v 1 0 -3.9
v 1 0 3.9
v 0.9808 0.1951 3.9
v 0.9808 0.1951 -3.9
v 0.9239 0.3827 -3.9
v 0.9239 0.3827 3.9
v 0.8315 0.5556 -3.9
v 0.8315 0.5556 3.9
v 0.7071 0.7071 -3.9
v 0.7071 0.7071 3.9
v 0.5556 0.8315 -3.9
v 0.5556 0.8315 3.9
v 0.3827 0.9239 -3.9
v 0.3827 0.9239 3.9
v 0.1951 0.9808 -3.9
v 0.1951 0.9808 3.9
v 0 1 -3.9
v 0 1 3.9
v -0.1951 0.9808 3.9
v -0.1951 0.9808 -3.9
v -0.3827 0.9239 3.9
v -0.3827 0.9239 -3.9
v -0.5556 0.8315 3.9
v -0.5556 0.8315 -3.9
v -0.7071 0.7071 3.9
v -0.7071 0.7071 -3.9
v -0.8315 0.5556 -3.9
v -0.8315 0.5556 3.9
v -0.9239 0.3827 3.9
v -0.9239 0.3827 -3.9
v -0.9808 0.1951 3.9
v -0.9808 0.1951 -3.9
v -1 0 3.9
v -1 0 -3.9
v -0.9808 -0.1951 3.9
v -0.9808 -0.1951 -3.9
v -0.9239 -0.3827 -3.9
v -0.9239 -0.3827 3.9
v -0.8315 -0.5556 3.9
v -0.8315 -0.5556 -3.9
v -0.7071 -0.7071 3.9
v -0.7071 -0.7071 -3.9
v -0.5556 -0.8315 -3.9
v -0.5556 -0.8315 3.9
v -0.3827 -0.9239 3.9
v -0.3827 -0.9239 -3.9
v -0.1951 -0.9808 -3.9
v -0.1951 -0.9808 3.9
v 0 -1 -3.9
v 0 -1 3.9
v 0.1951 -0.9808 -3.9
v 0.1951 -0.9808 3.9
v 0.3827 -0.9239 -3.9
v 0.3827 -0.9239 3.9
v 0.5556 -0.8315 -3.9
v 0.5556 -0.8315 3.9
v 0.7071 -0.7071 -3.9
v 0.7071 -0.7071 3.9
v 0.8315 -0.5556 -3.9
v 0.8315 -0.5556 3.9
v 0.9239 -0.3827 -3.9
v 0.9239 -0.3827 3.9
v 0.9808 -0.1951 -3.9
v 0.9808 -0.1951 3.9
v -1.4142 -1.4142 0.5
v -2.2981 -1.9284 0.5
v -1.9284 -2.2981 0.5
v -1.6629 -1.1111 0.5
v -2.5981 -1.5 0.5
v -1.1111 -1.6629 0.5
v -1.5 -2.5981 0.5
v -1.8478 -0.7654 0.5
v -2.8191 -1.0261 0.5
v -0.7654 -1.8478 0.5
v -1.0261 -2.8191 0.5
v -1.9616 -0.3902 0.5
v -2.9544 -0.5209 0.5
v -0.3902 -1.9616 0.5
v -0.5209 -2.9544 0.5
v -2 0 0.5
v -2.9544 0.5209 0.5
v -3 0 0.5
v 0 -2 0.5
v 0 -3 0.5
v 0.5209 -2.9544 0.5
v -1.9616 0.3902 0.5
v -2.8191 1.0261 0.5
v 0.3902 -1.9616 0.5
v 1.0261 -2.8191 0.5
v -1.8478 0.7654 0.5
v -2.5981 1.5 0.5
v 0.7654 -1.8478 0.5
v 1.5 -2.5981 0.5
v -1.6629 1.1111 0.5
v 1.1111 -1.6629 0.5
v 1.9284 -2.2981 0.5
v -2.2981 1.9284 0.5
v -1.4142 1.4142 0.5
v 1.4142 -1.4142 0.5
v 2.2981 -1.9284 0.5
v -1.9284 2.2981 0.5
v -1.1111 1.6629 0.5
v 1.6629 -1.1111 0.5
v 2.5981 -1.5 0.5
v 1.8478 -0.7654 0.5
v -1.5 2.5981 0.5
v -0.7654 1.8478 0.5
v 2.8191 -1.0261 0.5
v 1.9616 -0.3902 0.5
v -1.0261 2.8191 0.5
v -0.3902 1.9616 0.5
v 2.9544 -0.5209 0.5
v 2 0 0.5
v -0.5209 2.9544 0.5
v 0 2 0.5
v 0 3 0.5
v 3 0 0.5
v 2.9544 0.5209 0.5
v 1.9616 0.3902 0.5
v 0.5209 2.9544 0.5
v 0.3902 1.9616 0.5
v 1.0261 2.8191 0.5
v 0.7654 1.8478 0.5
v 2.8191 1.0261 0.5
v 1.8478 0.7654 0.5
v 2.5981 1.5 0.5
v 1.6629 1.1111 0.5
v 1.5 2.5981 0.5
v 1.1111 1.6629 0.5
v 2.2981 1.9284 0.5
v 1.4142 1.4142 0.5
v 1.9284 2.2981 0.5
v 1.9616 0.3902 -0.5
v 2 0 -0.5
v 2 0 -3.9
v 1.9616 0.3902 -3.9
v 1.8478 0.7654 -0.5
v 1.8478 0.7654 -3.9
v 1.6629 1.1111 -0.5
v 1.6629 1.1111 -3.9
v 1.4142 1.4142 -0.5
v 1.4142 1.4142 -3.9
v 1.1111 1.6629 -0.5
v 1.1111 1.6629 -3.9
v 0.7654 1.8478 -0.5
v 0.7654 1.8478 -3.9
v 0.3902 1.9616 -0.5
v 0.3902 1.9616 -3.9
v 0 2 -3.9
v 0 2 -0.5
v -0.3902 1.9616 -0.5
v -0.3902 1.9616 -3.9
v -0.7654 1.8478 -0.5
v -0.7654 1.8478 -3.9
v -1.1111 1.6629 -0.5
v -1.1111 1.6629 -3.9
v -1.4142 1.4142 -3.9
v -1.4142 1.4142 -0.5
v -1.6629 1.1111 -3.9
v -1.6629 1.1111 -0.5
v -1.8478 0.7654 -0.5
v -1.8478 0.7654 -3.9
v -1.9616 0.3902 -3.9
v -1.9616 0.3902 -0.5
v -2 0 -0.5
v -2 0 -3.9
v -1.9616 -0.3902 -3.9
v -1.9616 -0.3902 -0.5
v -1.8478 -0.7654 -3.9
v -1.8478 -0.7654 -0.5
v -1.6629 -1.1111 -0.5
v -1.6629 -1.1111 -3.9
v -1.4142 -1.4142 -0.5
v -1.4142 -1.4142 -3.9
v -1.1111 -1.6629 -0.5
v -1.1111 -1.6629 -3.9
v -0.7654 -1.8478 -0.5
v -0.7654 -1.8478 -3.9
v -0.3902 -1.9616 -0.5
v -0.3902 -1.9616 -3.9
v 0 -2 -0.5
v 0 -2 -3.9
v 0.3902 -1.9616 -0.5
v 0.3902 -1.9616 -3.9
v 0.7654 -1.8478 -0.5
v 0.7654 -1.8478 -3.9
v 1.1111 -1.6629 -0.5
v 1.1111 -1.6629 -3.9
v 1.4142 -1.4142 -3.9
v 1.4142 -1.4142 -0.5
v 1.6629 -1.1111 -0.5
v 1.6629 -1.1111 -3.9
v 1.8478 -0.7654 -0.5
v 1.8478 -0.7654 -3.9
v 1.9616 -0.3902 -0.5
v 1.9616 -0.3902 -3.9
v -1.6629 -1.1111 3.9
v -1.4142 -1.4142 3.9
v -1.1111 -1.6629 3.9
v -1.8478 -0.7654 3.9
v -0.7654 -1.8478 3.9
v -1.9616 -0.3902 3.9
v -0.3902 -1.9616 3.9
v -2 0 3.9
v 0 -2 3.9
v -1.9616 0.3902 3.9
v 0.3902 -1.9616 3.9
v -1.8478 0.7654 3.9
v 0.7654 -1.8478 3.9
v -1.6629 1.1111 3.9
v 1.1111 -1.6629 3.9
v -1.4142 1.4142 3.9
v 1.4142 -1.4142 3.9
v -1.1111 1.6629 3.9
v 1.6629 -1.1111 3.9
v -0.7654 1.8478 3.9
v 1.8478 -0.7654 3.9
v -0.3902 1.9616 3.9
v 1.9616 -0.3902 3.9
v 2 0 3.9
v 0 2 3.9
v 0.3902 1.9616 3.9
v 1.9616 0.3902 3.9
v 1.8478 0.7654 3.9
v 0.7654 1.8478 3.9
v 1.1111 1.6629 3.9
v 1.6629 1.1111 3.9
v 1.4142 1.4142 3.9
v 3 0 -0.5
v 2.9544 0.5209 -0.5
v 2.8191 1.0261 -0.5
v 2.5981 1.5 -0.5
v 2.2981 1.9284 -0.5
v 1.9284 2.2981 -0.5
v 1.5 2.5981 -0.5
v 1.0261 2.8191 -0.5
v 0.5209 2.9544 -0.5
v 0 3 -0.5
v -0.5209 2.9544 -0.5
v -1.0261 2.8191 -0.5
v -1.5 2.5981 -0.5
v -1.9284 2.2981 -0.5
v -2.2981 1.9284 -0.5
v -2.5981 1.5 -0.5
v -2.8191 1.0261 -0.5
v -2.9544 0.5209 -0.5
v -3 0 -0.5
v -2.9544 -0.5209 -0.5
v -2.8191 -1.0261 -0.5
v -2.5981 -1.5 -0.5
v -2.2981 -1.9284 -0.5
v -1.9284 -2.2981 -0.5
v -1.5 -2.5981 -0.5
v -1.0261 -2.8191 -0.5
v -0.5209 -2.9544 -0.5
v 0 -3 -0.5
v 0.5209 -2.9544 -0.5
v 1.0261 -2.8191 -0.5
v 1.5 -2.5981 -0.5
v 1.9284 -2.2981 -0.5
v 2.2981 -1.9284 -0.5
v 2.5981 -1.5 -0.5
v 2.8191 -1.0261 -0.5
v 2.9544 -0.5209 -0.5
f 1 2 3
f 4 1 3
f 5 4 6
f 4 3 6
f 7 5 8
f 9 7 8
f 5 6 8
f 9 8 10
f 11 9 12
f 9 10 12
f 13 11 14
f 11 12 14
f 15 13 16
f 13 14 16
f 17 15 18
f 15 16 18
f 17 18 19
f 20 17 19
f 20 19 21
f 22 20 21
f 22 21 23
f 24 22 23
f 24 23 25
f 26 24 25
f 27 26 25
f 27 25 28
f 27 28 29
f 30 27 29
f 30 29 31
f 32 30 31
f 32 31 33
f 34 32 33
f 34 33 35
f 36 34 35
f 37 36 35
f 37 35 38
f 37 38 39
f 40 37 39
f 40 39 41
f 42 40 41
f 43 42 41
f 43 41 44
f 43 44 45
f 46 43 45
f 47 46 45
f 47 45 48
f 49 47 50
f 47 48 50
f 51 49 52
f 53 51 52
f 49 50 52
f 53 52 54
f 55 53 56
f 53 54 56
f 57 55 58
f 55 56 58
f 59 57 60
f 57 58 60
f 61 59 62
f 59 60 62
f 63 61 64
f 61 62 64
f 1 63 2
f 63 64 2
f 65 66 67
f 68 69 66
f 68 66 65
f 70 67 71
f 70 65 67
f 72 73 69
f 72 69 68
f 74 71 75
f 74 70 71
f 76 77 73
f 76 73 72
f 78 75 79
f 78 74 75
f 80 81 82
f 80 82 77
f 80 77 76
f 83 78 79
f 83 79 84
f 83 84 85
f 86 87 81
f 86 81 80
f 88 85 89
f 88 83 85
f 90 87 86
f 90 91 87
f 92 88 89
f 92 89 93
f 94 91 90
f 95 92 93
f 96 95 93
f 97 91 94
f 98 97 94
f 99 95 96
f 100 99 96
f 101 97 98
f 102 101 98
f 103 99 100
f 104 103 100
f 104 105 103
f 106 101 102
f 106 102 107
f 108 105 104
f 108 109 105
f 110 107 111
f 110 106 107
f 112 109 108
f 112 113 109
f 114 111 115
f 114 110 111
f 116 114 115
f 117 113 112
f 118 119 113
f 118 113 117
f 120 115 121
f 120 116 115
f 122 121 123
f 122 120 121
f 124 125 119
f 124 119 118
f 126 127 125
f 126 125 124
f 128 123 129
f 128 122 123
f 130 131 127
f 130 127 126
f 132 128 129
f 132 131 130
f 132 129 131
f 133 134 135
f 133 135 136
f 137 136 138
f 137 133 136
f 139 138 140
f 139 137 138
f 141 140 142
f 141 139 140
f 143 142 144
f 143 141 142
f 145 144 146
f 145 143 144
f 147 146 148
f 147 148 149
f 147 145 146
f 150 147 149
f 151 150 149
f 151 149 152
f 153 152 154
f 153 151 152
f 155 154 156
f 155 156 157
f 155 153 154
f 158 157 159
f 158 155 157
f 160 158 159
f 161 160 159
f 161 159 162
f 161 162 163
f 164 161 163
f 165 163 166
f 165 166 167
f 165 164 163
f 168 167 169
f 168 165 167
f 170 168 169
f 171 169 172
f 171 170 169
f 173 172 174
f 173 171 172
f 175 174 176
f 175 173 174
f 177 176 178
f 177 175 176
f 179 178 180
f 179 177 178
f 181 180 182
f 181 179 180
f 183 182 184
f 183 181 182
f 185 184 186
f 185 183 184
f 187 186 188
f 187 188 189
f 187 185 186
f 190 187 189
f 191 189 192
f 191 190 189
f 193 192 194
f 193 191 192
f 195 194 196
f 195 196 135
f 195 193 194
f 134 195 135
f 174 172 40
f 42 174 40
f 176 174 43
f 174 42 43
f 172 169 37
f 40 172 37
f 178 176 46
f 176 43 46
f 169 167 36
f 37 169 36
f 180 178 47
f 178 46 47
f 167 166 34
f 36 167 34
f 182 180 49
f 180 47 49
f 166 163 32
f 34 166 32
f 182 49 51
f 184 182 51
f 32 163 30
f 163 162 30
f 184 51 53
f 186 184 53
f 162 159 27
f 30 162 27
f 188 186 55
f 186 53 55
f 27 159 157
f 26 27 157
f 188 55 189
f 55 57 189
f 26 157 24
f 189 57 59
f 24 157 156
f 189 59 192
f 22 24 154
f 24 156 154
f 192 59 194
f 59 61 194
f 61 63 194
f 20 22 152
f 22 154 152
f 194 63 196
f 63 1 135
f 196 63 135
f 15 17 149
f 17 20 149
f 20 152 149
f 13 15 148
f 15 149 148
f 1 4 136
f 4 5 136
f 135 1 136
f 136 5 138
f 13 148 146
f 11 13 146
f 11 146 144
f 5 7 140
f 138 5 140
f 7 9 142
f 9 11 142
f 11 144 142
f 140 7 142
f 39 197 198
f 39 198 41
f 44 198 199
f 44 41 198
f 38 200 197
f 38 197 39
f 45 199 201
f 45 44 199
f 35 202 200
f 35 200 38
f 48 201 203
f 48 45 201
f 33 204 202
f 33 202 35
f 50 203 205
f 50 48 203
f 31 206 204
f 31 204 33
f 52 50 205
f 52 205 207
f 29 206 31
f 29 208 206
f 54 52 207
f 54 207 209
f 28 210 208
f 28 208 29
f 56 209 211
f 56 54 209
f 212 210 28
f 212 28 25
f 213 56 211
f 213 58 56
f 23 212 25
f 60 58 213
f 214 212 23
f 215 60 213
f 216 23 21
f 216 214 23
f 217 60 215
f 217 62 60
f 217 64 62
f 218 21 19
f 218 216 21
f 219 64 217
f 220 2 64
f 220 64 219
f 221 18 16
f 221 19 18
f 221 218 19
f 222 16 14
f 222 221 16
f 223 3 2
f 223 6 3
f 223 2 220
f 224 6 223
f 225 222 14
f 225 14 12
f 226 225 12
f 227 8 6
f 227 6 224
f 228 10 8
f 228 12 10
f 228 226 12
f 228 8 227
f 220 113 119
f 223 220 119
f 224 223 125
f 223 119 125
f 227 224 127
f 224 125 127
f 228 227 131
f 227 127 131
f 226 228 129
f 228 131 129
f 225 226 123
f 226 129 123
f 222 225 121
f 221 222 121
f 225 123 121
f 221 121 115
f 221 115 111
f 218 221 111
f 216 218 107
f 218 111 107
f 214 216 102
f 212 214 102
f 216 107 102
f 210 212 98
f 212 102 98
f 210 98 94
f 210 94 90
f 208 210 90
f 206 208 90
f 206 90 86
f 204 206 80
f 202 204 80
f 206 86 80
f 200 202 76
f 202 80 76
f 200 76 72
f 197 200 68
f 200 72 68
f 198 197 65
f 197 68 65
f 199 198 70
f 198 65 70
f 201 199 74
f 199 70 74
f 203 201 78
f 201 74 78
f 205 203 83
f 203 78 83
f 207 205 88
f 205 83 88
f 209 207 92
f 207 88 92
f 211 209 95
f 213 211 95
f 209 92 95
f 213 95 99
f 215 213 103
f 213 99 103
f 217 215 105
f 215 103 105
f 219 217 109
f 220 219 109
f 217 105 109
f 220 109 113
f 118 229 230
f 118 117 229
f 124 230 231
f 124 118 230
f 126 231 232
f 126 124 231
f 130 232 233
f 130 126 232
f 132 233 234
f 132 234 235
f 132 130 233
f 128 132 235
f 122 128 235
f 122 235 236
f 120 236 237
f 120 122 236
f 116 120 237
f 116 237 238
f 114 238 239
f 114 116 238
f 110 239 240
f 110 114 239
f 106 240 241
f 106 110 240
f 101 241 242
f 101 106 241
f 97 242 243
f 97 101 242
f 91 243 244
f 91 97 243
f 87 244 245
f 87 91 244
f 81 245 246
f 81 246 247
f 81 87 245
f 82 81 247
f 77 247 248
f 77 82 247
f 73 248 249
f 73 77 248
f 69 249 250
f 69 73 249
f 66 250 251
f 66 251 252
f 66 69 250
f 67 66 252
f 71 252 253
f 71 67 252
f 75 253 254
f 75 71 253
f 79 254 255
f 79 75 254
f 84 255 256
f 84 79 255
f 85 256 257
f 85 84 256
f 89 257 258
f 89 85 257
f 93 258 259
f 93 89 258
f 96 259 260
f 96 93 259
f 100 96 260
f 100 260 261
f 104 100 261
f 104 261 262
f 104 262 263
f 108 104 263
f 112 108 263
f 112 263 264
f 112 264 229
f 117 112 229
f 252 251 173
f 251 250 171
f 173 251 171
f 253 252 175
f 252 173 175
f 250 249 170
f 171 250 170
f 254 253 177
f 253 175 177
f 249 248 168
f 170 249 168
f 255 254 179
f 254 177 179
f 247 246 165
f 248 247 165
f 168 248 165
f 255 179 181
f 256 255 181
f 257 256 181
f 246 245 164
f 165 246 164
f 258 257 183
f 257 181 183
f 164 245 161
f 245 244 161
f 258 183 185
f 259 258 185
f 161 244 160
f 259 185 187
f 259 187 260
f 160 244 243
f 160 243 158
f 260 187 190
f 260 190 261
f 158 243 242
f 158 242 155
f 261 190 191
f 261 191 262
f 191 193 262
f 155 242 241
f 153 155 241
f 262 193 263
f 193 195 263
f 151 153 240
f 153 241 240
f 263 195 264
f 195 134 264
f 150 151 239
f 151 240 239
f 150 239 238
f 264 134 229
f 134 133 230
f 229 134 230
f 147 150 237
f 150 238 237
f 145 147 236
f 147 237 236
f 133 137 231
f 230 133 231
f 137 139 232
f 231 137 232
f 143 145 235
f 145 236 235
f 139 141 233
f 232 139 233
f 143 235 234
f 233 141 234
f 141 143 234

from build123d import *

# Parameters (mm, degrees)
FLANGE_SKETCH_R      = 3
FLANGE_EXTRUDE_DEPTH = 0.5
JOINT_SKETCH_R       = 2
JOINT_EXTRUDE_DEPTH  = 3.4
HOLE_SKETCH_R        = 1
HOLE_EXTRUDE_DEPTH   = 9.879189152


with BuildPart() as part:
    # Flange Sketch → Flange Extrude (new, symmetric)
    with BuildSketch(Plane.XY):
        Circle(FLANGE_SKETCH_R)
    extrude(amount=FLANGE_EXTRUDE_DEPTH, both=True)

    # Joint Sketch → Joint Extrude (add)
    with BuildSketch(Plane.XY.offset(0.5)):
        Circle(JOINT_SKETCH_R)
    joint_extrude = extrude(amount=JOINT_EXTRUDE_DEPTH)

    # Joint Mirror: Joint Extrude across plane
    add(joint_extrude.mirror(Plane.XY))

    # Hole Sketch → Hole Extrude (cut, through all)
    with BuildSketch(Plane.XY.offset(3.9)):
        Circle(HOLE_SKETCH_R)
    extrude(amount=-HOLE_EXTRUDE_DEPTH, mode=Mode.SUBTRACT)


solid = part.part
